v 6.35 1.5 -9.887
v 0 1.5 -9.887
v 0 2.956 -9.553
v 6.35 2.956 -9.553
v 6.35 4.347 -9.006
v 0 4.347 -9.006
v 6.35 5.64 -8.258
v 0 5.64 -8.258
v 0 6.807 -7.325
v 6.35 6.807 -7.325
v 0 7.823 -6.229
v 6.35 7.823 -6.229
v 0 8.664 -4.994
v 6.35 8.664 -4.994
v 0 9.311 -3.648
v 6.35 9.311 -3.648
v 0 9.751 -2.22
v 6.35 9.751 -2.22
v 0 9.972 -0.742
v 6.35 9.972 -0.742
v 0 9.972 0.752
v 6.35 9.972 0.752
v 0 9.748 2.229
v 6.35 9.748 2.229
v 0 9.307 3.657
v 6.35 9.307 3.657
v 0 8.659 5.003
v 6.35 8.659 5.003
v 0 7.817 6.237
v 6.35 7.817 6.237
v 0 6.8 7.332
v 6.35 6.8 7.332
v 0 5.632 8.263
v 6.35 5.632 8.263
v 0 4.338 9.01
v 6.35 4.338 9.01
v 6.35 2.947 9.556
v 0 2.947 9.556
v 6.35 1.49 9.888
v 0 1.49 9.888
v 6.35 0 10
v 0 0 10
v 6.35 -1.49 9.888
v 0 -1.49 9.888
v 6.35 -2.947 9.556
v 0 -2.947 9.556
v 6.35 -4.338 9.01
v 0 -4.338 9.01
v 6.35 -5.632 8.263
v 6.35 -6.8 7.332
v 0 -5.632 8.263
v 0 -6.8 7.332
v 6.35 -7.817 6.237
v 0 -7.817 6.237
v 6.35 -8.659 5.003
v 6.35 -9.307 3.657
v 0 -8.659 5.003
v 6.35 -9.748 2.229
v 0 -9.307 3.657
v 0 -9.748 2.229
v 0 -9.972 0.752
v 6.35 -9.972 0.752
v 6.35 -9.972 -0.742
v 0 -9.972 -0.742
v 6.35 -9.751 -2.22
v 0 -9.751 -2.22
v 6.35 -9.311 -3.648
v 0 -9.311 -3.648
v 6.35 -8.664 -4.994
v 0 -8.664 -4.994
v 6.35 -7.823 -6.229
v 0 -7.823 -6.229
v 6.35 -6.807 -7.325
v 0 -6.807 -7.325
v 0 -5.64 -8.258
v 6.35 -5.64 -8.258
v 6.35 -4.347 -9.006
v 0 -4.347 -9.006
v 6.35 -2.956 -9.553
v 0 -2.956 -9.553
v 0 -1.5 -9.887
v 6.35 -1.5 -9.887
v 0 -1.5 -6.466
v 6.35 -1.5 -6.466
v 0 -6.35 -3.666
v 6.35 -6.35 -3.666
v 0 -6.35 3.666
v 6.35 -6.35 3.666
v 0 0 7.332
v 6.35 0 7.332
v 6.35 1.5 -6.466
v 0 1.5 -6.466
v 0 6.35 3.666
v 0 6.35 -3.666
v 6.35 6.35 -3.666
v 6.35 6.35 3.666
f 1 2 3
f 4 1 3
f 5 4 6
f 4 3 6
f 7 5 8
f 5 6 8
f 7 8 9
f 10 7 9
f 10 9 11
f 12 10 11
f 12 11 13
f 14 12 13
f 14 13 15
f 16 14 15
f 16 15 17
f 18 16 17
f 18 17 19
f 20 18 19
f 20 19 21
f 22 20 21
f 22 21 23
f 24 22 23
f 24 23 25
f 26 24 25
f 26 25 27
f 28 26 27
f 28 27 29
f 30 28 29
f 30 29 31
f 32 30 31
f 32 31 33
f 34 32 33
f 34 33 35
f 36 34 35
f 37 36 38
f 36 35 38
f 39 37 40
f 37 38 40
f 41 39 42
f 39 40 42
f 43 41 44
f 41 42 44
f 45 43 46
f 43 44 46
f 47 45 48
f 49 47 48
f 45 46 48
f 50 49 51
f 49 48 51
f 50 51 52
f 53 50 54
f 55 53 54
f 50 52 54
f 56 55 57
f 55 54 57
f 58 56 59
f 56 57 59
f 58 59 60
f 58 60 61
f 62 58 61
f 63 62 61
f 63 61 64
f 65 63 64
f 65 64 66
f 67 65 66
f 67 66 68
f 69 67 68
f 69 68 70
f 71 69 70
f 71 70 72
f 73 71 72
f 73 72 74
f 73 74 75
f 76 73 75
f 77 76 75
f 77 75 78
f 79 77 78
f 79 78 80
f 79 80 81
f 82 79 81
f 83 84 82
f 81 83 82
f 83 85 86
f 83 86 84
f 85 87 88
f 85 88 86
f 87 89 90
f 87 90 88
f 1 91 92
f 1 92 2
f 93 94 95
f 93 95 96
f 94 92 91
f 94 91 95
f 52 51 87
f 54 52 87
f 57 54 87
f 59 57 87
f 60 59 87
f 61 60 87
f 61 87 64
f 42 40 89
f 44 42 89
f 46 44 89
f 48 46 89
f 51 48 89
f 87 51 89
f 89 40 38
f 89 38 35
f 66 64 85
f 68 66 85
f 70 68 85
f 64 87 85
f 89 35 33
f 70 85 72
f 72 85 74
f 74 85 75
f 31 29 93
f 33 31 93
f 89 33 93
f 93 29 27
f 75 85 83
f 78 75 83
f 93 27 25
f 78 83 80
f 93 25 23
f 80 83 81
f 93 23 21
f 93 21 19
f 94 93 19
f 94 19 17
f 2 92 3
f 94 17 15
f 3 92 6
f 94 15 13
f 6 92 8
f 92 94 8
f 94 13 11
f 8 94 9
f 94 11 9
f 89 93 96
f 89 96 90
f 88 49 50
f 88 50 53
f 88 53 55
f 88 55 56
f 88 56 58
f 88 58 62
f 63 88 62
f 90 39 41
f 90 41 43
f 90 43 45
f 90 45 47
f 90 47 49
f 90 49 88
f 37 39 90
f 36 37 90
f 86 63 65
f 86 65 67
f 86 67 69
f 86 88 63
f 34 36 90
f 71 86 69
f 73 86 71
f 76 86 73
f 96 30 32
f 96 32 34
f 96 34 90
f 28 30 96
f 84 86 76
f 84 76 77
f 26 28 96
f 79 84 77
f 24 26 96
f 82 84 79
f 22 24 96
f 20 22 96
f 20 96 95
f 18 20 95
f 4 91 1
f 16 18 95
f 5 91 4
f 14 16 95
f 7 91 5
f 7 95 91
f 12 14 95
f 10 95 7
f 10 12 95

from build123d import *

# Parameters (mm, degrees)
SKETCH1_R           = 10
BOSS_EXTRUDE1_DEPTH = 6.35
SKETCH2_W           = 5.600108675
SKETCH2_H           = 3
CUT_EXTRUDE1_DEPTH  = 7.35


with BuildPart() as part:
    # Sketch1 → Boss-Extrude1 (new body)
    with BuildSketch(Plane(origin=(0, 0, 0), x_dir=(0, 0, -1), z_dir=(1, 0, 0))):
        Circle(SKETCH1_R)
        Polygon((7.332348419, 0), (3.666174209, 6.35), (-3.666174209, 6.35), (-7.332348419, 0), (-3.666174209, -6.35), (3.666174209, -6.35), align=None, mode=Mode.SUBTRACT)
    extrude(amount=BOSS_EXTRUDE1_DEPTH)

    # Sketch2 → Cut-Extrude1 (cut, through all)
    with BuildSketch(Plane(origin=(6.35, 0, 0), x_dir=(0, 0, -1), z_dir=(1, 0, 0))):
        with Locations((8.610205328, 0)):
            Rectangle(SKETCH2_W, SKETCH2_H)
    extrude(amount=-CUT_EXTRUDE1_DEPTH, mode=Mode.SUBTRACT)


solid = part.part
